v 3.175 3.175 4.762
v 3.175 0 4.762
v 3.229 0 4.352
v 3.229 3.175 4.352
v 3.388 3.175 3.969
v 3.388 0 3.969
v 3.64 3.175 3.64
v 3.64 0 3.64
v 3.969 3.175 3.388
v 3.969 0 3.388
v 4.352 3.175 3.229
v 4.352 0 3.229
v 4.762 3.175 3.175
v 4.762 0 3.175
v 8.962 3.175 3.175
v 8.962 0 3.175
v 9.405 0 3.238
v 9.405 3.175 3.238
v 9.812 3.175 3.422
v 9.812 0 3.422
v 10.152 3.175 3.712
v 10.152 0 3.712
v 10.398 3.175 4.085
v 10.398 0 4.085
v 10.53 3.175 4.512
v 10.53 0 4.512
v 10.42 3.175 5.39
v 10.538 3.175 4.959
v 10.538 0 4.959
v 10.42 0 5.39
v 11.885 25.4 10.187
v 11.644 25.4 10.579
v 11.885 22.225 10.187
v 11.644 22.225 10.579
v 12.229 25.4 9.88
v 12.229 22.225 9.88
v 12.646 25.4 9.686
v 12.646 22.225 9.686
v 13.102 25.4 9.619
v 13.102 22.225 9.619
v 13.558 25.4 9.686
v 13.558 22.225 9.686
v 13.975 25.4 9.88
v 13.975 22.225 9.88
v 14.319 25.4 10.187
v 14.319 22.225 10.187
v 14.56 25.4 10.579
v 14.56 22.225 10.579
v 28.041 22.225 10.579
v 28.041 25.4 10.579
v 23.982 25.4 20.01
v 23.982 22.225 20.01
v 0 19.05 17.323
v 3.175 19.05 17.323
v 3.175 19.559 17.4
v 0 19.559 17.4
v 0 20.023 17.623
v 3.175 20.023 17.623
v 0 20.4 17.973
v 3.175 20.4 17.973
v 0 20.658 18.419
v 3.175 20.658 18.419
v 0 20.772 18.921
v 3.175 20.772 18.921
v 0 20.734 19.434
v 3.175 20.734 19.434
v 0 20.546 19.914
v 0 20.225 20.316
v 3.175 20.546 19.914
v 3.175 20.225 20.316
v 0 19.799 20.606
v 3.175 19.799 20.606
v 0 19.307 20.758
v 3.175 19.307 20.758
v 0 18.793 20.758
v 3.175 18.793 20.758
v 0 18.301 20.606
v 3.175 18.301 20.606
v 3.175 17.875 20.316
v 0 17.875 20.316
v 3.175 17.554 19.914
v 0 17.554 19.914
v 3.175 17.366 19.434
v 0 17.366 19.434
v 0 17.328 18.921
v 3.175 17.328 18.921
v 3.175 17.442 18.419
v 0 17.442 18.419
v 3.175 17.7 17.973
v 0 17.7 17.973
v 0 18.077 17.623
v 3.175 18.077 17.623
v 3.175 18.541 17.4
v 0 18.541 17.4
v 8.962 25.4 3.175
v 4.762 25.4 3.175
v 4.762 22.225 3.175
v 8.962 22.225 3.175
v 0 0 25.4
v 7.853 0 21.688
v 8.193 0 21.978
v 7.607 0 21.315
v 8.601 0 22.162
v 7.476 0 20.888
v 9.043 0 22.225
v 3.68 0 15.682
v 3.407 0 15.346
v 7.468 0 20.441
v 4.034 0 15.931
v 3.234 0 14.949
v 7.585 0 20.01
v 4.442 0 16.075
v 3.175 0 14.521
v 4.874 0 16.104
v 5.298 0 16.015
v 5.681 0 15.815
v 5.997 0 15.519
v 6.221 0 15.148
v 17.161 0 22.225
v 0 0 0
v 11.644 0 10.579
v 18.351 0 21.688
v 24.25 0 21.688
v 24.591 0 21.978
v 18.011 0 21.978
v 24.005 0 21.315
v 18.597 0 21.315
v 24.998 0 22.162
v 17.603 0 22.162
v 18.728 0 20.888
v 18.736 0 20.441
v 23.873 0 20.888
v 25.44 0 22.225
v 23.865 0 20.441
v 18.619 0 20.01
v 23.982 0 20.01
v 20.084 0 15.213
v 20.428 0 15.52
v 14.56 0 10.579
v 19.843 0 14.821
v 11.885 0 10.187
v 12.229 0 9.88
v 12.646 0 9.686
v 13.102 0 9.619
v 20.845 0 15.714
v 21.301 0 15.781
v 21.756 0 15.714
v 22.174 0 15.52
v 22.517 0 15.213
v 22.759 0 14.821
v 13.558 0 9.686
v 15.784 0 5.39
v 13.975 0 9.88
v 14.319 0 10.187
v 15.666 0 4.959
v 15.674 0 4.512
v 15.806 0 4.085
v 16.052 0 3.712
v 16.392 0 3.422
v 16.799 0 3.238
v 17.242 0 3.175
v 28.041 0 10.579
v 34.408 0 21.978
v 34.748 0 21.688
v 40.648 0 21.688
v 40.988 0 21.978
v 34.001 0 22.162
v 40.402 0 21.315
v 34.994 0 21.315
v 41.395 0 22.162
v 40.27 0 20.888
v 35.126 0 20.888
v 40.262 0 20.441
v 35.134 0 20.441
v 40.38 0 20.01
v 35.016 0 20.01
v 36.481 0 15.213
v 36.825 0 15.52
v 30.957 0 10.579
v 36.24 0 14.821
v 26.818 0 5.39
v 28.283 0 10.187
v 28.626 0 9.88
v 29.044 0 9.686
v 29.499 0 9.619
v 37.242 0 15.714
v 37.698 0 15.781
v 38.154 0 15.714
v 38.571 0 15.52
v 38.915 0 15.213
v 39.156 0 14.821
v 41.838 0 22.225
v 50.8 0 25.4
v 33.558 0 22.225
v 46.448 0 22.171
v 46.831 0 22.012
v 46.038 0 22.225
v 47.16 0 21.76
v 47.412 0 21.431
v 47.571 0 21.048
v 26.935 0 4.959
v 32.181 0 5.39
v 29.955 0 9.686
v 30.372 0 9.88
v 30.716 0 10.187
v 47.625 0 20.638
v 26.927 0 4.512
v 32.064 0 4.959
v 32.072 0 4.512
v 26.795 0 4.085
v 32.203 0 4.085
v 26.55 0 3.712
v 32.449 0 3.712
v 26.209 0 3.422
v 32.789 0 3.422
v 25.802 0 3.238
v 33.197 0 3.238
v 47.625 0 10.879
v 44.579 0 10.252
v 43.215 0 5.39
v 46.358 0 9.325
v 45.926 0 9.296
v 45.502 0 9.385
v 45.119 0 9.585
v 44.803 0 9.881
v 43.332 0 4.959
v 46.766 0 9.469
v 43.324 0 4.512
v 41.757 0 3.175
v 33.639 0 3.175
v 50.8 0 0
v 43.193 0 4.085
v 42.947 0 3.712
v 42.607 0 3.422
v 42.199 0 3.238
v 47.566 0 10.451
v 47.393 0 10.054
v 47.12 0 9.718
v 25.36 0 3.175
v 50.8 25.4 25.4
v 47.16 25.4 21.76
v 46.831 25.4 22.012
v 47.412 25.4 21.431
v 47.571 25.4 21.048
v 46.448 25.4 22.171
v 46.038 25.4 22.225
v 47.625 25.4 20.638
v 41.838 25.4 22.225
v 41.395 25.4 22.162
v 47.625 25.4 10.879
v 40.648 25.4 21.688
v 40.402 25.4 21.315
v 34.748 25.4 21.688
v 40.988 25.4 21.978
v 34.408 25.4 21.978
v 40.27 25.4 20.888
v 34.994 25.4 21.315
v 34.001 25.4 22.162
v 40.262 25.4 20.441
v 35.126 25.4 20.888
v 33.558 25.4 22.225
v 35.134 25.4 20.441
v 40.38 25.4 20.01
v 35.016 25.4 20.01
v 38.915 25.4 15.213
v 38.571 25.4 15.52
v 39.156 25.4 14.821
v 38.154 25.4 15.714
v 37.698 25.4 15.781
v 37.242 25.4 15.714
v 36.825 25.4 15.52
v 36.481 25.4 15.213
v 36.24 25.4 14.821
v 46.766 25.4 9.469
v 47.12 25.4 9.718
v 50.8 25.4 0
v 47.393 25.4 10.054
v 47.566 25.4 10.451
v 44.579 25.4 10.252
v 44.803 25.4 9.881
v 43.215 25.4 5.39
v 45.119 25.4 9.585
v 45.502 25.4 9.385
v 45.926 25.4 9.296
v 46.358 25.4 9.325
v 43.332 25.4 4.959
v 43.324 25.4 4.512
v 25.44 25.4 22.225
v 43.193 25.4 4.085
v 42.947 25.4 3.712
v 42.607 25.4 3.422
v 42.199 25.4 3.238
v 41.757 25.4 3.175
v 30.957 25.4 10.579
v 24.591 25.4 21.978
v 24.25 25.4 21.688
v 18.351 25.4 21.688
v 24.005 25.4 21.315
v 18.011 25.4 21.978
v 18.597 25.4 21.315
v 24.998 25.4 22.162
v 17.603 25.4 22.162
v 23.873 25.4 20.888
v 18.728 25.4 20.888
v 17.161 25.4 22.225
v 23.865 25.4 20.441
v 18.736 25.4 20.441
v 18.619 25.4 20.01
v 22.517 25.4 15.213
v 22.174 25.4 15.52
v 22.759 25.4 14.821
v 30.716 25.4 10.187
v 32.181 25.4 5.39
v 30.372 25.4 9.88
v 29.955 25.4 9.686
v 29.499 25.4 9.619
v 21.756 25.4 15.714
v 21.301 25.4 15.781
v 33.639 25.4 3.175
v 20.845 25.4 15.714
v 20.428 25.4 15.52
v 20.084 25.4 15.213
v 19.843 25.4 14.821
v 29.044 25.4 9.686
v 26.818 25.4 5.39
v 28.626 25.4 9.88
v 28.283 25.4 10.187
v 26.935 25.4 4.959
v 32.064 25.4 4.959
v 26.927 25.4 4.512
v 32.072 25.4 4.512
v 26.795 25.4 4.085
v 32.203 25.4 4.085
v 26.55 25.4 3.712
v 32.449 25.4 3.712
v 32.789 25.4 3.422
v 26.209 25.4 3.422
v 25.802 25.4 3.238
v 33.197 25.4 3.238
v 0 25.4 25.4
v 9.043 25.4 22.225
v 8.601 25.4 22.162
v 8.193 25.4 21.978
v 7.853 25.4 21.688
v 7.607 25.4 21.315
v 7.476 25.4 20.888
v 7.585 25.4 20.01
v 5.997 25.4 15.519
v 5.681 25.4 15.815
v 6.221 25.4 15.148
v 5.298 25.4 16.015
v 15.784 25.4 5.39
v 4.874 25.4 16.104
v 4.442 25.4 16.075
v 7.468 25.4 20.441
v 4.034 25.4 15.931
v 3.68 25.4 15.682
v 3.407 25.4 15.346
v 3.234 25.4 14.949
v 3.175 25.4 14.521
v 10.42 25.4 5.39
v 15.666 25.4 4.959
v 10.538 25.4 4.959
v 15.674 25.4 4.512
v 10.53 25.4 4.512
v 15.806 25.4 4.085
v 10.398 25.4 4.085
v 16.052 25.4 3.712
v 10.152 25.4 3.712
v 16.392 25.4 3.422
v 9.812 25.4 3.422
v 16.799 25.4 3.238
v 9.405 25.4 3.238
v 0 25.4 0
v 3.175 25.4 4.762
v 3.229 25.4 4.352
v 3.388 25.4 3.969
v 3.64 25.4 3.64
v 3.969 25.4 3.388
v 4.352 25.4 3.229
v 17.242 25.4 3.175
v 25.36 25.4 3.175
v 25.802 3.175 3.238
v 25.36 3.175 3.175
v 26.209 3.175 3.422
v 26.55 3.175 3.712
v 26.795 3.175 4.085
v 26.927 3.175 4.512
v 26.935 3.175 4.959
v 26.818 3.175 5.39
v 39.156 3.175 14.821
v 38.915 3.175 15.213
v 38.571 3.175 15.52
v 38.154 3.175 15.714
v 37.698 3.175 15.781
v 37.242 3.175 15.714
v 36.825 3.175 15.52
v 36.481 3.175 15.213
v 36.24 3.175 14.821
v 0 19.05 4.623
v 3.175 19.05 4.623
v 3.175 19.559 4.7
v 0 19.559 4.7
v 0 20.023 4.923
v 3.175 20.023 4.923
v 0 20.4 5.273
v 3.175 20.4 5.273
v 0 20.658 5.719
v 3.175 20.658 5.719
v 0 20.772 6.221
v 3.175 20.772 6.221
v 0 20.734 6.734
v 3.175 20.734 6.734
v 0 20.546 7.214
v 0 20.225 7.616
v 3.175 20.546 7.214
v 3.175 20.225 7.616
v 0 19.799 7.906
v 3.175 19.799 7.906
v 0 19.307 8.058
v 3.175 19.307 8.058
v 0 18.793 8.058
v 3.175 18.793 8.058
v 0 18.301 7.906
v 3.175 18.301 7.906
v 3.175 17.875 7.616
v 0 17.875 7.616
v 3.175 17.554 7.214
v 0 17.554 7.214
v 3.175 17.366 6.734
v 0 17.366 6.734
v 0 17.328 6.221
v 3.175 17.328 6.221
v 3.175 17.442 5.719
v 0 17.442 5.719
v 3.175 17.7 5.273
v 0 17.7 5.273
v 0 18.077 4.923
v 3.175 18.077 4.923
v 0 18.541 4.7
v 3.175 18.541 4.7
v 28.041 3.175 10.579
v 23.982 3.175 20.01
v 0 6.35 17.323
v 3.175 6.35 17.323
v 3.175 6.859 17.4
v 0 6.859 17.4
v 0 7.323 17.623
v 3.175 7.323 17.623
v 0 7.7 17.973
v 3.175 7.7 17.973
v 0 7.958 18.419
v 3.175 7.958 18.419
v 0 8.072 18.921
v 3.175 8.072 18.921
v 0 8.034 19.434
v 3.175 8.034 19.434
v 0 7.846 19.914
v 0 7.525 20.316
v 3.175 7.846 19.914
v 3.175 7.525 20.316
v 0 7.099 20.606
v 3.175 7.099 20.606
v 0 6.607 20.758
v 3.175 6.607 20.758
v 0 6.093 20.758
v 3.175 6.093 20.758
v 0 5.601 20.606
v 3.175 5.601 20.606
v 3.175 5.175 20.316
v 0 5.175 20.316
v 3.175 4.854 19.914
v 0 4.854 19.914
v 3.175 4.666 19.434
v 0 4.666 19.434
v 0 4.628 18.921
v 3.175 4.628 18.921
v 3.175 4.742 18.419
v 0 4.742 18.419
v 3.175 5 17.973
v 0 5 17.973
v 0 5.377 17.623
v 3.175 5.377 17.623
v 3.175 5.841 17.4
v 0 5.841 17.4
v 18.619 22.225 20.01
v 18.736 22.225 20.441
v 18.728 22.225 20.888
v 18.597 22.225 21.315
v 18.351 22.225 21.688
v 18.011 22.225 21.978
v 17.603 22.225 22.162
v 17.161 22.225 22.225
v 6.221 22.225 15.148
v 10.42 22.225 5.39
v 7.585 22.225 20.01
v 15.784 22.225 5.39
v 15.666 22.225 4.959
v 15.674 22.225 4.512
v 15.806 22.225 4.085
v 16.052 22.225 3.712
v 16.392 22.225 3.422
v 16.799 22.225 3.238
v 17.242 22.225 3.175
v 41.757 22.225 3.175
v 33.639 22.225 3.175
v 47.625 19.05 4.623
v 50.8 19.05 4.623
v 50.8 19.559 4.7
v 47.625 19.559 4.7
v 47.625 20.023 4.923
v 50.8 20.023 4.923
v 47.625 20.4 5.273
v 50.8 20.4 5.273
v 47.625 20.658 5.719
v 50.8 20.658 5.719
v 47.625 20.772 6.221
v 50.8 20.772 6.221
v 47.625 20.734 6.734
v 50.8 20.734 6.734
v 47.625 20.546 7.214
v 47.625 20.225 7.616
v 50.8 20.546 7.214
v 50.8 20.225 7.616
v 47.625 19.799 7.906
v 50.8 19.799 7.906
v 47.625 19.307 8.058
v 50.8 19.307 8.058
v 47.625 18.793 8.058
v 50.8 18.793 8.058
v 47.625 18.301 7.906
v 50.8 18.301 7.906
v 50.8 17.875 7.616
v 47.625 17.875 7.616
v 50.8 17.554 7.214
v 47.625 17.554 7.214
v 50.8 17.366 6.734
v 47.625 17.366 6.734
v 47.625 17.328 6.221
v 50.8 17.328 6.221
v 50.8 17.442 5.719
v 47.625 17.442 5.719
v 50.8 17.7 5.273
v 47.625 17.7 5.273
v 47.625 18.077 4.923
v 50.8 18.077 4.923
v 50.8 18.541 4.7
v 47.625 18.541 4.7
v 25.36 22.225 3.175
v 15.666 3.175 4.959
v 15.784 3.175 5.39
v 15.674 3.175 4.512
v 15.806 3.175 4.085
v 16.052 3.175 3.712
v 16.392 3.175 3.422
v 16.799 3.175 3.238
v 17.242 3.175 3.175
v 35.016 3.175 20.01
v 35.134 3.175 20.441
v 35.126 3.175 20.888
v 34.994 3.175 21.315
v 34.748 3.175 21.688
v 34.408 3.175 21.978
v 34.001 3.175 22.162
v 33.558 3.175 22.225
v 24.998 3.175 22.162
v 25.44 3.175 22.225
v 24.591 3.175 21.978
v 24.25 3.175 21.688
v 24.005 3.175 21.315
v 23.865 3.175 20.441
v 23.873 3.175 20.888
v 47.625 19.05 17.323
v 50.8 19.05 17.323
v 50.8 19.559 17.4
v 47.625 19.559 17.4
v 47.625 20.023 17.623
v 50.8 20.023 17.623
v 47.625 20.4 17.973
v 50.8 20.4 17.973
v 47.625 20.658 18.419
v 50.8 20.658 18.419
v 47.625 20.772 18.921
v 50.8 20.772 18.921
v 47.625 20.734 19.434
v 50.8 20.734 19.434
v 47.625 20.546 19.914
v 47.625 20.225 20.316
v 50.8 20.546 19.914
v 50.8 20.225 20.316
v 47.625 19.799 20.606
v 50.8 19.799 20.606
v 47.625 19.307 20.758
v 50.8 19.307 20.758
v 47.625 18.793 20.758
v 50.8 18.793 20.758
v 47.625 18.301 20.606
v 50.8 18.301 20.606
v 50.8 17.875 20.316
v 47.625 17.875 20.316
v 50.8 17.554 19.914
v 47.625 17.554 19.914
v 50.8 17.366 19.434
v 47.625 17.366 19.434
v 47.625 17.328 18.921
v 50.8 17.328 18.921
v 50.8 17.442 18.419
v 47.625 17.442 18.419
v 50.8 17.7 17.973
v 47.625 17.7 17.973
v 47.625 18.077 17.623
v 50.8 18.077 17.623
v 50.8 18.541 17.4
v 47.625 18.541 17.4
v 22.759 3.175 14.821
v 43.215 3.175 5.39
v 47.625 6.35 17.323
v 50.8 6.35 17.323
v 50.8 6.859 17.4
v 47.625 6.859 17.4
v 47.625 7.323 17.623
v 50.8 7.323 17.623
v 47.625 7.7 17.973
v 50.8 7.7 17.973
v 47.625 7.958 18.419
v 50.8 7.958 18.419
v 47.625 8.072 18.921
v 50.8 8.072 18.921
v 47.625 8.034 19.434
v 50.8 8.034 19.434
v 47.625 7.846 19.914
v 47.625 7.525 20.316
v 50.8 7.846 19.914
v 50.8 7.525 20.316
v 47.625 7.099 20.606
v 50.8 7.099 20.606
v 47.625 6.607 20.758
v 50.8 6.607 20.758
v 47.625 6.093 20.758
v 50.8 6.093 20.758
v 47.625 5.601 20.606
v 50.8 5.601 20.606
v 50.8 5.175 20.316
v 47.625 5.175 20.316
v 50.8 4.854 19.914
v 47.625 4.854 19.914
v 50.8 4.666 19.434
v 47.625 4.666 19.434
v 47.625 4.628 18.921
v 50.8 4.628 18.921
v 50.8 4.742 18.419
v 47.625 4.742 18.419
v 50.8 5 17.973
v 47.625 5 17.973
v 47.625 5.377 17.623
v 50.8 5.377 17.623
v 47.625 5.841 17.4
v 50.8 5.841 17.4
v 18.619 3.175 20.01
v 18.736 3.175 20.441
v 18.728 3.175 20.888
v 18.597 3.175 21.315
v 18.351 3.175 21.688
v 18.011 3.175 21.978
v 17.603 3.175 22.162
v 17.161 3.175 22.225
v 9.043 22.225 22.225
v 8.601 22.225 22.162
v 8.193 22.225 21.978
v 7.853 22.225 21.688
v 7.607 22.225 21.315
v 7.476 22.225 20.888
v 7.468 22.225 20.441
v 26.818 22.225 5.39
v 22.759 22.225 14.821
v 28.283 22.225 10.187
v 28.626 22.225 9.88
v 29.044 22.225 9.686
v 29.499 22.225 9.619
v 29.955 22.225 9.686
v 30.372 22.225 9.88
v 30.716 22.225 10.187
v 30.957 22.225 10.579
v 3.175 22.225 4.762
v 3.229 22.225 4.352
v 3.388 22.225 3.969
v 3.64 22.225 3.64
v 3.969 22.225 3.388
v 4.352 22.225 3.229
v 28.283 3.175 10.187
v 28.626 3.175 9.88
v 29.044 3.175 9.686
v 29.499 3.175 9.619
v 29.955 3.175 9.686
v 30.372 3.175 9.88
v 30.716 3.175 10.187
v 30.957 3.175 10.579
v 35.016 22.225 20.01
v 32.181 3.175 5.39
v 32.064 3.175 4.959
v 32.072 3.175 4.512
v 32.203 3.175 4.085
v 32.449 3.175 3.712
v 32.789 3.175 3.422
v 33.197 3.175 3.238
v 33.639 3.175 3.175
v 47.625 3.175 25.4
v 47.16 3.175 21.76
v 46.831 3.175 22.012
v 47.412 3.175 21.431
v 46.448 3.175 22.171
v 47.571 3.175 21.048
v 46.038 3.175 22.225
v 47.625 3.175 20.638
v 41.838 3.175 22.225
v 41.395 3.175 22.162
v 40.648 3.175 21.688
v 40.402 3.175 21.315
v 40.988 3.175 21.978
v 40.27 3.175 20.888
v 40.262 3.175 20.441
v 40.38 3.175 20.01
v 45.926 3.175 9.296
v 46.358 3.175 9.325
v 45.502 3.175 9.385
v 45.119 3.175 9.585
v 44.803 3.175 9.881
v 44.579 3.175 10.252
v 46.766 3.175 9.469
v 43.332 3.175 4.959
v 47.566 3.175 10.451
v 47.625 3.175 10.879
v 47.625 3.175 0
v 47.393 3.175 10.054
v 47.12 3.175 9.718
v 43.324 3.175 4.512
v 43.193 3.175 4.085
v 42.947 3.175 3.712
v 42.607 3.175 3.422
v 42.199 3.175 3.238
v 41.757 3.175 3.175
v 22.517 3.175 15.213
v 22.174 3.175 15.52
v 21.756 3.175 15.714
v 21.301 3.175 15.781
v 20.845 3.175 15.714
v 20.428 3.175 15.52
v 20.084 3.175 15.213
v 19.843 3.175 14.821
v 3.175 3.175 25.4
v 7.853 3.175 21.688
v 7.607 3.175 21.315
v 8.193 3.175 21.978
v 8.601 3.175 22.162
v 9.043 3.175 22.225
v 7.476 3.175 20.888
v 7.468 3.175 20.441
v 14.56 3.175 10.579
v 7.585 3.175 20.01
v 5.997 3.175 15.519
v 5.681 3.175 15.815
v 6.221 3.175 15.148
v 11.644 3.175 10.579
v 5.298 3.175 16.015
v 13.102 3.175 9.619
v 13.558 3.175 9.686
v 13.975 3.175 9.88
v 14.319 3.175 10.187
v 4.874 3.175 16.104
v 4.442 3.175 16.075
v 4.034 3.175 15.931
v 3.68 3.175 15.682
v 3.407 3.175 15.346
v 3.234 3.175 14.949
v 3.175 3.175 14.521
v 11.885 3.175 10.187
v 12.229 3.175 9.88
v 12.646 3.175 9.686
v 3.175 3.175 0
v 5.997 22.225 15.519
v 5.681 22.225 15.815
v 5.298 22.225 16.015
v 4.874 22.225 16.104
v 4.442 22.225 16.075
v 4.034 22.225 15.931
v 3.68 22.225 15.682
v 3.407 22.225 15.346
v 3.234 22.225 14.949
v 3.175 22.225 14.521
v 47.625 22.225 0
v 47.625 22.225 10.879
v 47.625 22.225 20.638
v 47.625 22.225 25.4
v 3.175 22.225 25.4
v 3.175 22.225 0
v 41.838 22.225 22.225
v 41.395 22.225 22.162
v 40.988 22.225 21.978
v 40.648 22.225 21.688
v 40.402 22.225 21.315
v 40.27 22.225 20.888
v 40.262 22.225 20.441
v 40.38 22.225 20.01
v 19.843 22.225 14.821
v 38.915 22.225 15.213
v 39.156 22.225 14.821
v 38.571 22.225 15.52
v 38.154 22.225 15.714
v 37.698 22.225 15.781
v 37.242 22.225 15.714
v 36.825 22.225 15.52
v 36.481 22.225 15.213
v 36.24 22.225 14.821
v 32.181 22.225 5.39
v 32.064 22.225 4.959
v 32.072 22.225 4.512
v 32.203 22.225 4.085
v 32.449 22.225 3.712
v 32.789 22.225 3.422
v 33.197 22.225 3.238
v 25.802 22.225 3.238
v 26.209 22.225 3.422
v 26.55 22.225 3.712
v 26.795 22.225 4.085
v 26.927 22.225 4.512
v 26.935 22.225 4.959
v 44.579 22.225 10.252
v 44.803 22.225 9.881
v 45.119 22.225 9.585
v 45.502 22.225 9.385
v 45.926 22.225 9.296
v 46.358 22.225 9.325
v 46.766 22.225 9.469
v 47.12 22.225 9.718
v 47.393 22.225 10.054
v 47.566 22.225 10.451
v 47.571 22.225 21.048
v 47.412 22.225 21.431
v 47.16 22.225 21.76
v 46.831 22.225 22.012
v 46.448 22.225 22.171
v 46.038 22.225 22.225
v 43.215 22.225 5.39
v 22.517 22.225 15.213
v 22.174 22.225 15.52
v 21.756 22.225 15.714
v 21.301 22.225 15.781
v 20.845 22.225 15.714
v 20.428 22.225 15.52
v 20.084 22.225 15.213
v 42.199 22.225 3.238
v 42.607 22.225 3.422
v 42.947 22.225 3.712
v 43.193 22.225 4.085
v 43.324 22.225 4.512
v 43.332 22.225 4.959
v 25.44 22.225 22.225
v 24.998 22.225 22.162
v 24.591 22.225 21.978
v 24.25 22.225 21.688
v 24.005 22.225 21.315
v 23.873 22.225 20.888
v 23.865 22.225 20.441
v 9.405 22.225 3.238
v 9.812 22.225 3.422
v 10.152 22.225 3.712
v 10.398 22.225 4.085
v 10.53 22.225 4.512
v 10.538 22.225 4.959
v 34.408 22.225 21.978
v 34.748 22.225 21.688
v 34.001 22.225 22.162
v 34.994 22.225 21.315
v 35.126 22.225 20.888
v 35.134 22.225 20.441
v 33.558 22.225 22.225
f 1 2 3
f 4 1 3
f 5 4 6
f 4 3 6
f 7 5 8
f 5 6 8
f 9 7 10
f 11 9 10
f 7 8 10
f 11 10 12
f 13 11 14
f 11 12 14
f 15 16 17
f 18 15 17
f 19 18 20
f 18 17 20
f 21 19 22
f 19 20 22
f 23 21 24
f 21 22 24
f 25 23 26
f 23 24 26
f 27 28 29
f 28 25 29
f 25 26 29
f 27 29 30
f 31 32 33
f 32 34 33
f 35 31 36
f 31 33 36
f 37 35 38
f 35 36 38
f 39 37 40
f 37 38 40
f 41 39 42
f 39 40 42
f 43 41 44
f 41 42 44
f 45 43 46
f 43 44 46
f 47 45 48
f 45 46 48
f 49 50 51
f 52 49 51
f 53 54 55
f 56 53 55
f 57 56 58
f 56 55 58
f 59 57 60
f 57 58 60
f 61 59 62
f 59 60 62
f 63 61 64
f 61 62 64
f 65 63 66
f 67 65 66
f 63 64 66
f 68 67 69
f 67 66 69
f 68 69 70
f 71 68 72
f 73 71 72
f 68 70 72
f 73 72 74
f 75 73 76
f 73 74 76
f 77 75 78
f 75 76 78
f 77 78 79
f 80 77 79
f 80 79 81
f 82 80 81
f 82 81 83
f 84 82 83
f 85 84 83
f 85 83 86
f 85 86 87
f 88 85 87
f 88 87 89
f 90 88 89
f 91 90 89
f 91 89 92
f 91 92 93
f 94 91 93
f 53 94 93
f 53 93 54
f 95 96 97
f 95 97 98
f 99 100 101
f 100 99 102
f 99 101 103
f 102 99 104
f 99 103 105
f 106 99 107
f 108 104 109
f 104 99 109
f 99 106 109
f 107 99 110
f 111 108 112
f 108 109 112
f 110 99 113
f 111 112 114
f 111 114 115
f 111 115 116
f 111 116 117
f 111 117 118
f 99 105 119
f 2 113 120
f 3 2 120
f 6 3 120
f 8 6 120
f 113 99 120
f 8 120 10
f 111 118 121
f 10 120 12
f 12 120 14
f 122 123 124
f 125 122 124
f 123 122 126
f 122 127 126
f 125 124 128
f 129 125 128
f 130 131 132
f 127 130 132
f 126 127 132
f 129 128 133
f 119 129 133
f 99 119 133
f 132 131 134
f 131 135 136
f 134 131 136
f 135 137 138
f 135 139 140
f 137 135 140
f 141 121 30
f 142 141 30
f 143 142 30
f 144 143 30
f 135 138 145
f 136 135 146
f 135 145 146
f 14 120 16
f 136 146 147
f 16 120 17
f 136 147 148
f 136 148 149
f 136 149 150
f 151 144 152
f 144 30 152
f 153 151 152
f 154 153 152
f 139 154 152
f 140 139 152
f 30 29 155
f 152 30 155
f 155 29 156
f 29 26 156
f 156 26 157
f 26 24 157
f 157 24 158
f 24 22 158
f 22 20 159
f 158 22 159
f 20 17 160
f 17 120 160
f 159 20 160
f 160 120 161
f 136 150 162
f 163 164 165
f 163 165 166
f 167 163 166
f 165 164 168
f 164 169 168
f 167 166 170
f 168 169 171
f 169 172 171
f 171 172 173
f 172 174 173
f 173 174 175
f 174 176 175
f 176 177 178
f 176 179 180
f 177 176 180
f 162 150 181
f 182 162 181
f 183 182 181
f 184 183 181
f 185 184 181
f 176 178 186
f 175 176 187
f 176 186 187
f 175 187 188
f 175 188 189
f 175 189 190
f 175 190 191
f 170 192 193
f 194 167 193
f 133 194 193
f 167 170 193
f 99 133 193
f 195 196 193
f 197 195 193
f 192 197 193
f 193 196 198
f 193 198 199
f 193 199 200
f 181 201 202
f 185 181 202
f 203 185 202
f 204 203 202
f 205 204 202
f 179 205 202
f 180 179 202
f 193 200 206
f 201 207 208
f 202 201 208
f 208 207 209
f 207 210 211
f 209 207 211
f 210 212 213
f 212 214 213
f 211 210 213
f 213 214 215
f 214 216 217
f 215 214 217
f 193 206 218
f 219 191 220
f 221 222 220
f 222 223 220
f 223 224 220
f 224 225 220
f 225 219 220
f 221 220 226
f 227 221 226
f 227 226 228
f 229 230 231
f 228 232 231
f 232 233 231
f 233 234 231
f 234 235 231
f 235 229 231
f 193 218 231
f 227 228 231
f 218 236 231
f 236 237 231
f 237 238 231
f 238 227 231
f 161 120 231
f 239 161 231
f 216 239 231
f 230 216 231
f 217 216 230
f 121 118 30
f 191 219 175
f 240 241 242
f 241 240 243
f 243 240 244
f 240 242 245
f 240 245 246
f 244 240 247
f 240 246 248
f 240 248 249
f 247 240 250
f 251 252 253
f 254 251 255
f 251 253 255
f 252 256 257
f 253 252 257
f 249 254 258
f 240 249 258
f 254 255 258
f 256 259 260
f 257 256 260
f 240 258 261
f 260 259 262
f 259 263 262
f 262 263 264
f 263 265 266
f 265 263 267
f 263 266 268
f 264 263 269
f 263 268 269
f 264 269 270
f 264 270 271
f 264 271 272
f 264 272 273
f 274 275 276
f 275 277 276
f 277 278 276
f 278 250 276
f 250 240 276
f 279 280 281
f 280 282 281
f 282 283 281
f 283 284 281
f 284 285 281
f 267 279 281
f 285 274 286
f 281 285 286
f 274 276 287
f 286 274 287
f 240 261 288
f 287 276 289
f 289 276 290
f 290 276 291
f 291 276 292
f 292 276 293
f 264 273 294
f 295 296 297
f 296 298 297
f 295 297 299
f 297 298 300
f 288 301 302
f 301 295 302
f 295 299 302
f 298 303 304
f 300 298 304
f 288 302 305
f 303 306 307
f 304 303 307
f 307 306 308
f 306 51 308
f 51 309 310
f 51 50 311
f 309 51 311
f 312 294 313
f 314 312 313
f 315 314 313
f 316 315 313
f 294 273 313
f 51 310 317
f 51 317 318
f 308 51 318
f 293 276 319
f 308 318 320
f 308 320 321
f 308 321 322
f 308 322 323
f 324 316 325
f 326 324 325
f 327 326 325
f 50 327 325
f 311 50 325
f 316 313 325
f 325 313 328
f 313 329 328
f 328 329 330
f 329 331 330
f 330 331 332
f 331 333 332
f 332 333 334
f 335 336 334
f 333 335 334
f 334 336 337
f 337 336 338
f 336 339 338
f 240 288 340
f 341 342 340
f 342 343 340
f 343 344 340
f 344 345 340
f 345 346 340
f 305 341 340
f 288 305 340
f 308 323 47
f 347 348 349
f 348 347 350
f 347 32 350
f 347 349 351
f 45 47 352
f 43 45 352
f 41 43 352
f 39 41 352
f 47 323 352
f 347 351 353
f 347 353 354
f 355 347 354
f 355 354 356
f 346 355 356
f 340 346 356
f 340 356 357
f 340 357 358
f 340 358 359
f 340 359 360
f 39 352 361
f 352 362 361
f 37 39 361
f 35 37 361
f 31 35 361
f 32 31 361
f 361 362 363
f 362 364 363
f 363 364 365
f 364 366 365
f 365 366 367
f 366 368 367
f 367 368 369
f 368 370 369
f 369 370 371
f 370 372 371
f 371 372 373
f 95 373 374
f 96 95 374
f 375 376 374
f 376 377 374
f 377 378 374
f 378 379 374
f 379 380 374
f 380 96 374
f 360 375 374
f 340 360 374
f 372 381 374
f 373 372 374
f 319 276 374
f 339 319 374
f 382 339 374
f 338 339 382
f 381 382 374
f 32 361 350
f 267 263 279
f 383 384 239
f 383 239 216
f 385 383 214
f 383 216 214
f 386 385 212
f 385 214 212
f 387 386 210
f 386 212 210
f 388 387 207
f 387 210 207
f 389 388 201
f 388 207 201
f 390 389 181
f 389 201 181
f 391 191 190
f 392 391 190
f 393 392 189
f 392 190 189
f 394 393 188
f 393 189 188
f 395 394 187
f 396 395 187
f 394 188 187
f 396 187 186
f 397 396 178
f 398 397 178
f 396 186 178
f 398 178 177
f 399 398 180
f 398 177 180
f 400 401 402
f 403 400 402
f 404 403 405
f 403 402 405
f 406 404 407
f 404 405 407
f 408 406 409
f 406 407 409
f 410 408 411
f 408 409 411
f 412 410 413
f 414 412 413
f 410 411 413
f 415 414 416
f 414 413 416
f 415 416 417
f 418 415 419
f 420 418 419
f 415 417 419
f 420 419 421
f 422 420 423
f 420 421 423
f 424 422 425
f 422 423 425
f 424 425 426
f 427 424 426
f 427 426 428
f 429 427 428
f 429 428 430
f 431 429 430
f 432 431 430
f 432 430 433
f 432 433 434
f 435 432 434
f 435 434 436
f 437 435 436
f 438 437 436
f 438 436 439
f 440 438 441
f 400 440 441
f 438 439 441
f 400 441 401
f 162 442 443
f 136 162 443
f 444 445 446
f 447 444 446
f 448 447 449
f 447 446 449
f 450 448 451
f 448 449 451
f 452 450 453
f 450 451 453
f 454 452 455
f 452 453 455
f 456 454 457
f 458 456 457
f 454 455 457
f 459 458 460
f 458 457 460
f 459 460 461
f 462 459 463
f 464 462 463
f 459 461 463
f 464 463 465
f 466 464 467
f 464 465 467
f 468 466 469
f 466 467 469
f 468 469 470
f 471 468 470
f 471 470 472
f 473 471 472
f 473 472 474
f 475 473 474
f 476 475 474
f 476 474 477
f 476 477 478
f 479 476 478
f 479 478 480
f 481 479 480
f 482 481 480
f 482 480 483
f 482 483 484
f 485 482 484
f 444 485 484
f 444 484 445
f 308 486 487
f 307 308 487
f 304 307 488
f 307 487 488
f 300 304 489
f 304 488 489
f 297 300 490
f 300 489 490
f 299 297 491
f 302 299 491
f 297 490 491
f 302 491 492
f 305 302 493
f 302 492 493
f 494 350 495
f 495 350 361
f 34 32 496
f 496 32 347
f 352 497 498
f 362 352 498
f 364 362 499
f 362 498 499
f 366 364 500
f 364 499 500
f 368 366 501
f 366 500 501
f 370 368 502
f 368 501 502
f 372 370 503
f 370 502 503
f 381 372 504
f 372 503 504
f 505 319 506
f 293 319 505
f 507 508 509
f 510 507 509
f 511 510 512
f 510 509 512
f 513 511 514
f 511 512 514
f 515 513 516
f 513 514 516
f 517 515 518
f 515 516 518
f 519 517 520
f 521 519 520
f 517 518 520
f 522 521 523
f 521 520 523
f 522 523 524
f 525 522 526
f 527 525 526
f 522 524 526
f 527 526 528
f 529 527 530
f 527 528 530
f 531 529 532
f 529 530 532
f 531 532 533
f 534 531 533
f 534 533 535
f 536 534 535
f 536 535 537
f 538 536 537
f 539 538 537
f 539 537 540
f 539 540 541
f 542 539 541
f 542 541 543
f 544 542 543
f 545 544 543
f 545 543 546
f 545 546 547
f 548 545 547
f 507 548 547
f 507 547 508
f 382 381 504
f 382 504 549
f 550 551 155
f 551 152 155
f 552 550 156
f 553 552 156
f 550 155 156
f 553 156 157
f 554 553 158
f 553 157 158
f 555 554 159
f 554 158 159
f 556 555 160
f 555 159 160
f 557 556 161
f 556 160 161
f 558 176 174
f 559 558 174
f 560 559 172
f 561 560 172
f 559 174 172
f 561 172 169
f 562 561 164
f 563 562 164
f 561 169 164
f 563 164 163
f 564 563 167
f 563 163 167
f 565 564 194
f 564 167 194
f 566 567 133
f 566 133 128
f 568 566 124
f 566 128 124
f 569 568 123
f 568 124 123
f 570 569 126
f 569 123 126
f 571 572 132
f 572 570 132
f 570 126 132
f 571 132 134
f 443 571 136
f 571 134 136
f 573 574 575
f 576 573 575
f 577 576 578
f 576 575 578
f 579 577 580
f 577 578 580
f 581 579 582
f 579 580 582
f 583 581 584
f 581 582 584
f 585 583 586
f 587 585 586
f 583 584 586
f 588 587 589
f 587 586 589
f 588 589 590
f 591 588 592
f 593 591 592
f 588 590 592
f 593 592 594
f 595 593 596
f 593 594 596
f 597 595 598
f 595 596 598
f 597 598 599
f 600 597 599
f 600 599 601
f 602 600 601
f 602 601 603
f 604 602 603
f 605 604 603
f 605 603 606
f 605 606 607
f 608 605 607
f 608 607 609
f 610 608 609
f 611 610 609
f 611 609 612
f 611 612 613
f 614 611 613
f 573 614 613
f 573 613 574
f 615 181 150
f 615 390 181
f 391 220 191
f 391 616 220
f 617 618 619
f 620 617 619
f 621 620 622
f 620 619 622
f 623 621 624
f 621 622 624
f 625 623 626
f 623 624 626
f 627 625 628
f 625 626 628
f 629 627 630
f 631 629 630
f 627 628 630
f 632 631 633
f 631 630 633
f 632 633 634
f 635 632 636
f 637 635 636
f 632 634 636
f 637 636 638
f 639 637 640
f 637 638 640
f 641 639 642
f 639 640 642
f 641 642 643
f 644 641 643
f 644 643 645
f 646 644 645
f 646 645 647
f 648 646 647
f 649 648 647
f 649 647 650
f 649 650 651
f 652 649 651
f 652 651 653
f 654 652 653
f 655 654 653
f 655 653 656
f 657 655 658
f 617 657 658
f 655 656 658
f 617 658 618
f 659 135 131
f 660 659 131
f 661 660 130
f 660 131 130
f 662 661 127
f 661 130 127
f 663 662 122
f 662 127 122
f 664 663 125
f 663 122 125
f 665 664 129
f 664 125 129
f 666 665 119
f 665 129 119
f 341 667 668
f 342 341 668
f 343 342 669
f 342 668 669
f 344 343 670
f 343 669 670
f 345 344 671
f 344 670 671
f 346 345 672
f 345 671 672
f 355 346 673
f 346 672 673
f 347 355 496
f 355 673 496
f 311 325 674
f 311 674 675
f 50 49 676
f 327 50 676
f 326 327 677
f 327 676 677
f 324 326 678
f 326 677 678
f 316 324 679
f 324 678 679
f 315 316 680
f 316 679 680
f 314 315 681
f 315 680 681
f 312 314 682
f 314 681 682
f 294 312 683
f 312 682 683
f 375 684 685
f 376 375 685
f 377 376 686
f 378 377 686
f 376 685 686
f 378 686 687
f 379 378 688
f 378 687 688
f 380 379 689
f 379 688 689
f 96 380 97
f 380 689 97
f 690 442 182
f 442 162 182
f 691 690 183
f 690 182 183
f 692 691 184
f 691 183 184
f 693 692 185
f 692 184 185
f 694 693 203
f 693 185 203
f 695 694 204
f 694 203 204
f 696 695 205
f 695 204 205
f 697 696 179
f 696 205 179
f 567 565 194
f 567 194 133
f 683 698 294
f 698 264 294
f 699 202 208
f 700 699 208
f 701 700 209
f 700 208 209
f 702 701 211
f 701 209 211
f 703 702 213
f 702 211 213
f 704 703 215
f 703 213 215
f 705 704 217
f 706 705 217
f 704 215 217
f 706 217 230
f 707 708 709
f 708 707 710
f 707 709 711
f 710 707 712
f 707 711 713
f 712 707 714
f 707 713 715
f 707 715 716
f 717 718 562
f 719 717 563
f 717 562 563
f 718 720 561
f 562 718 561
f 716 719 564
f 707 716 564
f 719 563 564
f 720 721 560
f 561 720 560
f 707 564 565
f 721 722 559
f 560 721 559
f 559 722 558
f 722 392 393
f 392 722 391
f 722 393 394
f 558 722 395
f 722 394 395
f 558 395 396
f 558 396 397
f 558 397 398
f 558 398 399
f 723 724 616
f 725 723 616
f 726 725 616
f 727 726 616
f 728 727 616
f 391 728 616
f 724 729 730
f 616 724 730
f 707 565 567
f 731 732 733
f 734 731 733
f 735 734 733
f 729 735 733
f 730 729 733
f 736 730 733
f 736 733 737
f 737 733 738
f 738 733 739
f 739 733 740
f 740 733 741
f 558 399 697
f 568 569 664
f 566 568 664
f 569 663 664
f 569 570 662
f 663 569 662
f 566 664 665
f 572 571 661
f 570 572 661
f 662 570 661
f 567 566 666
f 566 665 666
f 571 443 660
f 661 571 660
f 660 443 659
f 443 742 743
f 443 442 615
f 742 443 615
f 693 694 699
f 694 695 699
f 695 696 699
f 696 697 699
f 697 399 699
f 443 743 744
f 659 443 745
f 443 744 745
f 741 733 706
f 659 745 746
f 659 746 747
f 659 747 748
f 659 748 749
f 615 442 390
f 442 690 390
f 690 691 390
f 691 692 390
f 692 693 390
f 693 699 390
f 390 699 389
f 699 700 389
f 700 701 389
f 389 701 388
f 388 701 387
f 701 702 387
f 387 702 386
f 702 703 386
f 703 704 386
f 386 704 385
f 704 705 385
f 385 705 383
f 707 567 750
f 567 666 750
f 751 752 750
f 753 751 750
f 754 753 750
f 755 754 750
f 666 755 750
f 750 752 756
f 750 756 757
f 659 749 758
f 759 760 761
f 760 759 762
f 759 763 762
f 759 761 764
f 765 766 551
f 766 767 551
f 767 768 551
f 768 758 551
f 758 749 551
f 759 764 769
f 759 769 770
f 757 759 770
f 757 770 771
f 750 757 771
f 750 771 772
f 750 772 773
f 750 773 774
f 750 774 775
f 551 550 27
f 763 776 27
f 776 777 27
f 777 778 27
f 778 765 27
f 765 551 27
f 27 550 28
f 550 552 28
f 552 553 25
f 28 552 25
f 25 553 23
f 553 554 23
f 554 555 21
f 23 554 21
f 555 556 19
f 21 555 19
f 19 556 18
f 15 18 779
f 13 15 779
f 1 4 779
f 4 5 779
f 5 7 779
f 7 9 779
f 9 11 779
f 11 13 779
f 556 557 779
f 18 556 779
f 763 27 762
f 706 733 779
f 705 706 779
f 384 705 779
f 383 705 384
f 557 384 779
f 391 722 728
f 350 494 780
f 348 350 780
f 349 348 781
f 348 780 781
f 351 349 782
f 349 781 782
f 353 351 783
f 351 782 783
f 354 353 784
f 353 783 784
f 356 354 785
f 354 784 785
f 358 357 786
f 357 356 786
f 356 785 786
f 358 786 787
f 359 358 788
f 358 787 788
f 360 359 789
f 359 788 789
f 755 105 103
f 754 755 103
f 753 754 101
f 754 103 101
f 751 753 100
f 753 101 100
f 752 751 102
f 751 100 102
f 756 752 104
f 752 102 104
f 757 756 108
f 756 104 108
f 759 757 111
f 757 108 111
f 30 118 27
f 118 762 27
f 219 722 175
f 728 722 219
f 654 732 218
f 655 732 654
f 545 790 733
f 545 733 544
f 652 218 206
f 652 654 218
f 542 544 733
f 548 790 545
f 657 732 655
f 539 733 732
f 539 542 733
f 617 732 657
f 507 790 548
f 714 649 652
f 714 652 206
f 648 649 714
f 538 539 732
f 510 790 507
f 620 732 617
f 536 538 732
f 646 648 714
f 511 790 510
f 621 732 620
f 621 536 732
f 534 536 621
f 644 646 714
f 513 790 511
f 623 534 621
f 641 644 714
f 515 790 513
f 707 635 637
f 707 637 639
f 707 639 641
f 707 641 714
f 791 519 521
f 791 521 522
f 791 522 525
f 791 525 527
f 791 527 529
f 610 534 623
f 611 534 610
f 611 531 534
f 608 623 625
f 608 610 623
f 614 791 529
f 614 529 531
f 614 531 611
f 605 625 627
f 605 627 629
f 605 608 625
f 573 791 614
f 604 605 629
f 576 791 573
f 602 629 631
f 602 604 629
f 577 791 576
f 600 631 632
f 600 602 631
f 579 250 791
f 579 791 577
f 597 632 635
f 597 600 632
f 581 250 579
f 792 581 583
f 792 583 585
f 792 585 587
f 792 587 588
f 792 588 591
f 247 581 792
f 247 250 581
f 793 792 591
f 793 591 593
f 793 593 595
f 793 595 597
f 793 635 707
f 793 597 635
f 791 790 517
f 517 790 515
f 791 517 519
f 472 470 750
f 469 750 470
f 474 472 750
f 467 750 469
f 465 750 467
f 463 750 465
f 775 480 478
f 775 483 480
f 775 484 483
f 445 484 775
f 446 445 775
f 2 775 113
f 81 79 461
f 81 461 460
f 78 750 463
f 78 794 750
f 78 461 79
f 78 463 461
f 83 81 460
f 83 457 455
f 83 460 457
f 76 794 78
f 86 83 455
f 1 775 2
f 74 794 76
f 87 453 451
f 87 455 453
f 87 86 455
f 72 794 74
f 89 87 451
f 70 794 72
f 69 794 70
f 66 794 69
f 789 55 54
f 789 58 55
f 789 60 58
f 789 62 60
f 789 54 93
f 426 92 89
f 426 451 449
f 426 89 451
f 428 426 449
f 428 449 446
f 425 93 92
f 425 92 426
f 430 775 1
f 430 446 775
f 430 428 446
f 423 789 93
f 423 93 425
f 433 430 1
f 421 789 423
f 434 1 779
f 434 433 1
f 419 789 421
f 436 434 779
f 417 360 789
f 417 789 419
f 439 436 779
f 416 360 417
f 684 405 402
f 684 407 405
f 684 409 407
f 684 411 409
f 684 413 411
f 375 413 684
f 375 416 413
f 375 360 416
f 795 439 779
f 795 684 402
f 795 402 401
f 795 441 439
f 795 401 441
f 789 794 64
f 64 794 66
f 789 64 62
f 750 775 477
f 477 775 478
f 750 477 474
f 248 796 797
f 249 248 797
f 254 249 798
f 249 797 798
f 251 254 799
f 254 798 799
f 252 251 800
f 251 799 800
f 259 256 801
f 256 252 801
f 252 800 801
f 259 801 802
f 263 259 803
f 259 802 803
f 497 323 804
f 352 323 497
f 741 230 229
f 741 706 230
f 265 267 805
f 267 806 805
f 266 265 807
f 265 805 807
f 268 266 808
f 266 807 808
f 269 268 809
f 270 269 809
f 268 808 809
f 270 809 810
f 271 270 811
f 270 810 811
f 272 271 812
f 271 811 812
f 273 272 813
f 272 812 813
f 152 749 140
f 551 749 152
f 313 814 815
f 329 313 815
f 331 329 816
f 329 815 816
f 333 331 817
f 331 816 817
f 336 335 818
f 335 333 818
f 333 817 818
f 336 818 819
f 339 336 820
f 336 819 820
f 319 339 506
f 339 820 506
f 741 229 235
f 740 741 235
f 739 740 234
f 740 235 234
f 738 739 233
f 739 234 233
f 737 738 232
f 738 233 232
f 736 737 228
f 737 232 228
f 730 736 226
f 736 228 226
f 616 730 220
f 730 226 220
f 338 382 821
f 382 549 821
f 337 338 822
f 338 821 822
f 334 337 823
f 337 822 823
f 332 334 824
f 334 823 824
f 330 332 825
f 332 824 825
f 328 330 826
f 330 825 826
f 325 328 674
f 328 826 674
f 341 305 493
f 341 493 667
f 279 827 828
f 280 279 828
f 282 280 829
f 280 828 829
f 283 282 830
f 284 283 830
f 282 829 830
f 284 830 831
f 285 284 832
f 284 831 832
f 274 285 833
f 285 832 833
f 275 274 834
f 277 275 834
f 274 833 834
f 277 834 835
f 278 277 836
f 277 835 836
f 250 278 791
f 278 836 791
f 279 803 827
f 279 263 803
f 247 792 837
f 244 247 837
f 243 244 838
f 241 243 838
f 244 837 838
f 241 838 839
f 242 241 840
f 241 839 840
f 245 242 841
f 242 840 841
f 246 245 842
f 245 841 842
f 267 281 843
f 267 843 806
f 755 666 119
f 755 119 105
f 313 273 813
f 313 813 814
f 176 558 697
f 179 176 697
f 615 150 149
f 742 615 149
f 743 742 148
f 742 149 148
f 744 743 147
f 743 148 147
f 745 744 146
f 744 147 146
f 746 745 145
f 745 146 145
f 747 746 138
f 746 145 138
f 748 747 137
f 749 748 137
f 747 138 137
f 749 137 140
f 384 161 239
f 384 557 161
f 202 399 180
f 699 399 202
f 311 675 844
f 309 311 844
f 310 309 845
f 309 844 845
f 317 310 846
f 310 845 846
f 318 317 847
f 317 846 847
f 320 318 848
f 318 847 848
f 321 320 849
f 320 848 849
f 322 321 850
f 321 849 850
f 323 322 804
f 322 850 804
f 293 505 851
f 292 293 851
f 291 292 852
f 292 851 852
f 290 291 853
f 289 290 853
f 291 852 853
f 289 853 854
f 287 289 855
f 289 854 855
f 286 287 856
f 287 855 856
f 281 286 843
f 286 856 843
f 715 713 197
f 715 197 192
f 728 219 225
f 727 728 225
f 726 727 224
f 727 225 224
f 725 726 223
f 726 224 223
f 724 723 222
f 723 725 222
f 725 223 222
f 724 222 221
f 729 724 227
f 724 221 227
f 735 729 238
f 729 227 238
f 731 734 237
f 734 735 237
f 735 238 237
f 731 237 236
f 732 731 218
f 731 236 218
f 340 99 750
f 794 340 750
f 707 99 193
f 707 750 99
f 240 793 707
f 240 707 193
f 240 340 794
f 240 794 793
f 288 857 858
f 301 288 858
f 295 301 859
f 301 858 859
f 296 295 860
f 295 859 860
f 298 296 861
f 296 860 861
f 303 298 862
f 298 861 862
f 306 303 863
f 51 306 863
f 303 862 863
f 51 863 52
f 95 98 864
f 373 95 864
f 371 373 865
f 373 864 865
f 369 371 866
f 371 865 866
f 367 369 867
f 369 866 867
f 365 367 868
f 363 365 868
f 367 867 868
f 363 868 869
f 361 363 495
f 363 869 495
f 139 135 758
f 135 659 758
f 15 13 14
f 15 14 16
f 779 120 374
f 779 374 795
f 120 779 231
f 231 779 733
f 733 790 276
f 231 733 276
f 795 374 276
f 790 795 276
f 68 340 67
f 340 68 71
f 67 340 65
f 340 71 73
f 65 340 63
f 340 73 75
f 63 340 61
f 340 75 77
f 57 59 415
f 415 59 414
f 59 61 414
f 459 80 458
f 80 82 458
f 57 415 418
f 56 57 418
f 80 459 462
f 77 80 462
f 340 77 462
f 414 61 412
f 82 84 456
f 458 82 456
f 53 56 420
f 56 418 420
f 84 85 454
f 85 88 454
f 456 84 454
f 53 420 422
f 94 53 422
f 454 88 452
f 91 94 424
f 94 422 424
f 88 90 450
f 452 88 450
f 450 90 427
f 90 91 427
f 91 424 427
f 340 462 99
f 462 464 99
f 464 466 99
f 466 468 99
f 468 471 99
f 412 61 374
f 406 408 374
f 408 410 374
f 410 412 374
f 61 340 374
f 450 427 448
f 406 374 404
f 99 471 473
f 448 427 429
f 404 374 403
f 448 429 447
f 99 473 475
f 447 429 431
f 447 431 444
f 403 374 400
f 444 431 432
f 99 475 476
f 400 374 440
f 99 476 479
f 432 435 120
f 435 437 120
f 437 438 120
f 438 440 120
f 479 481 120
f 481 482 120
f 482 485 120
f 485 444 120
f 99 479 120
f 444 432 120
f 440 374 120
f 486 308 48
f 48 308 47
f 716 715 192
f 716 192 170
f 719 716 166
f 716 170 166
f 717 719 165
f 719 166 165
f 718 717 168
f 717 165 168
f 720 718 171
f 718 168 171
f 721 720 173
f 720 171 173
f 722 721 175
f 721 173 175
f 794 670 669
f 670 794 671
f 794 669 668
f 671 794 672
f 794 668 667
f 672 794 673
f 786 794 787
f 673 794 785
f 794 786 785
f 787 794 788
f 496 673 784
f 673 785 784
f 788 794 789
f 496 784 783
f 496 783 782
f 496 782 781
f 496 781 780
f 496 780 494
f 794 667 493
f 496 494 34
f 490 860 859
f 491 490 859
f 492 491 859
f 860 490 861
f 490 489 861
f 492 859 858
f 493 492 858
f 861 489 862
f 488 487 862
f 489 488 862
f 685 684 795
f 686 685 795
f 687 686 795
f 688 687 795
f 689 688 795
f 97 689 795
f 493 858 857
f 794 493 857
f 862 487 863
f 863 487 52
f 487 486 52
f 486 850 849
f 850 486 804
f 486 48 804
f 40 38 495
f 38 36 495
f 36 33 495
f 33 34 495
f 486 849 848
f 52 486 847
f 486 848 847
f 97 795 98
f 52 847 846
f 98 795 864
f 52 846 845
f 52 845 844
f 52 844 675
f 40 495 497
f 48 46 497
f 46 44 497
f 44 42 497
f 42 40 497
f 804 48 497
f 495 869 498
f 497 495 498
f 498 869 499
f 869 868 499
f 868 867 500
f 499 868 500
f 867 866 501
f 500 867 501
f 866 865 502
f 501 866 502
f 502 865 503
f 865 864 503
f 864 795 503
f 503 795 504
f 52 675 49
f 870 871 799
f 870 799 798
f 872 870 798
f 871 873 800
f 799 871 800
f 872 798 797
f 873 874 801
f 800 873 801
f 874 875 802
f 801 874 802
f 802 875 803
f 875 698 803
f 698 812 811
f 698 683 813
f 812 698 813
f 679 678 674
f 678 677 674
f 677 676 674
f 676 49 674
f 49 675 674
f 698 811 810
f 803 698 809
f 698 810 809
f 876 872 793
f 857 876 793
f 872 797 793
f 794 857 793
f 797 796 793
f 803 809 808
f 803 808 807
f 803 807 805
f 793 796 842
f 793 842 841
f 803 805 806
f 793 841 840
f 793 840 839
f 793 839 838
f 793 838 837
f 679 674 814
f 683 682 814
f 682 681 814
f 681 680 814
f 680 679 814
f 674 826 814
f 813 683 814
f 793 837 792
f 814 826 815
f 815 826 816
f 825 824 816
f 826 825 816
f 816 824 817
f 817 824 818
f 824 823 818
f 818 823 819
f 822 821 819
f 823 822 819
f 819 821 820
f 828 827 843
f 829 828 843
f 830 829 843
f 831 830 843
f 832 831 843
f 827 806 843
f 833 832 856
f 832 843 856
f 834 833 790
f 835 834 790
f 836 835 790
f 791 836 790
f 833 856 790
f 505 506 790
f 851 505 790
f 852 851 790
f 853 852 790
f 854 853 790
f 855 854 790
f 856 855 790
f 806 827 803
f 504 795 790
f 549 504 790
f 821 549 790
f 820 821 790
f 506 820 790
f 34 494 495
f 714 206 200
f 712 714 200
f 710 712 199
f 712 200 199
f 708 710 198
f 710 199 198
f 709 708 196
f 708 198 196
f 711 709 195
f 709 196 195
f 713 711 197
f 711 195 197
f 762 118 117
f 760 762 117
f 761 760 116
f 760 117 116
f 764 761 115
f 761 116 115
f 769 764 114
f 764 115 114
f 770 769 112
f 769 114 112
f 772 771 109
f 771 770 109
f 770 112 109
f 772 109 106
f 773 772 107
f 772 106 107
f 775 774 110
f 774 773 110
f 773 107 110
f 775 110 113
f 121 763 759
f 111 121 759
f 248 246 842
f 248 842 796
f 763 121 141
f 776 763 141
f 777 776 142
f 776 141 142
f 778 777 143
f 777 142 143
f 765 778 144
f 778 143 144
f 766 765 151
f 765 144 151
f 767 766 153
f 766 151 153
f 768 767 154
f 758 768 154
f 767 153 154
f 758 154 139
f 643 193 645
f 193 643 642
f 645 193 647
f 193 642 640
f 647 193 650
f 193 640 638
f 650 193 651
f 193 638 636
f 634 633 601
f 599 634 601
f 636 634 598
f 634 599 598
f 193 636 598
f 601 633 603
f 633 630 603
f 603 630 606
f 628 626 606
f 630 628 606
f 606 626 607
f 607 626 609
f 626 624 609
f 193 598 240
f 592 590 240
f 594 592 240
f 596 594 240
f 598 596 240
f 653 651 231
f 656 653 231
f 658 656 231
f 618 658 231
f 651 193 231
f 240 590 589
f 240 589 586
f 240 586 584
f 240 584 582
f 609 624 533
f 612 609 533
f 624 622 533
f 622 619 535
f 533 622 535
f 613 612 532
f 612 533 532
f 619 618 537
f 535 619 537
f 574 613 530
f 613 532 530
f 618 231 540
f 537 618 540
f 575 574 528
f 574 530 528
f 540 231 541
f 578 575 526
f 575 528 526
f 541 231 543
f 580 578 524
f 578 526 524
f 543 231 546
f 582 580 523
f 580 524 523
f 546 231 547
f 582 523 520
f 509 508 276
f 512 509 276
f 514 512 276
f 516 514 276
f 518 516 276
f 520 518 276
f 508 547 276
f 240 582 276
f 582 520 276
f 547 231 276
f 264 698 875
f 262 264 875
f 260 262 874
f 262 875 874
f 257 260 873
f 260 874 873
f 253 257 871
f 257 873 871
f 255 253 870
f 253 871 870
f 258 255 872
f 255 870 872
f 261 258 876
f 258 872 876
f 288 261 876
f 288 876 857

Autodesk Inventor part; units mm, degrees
ref_plane "YZ Plane" through (0, 0, 0) normal (1, 0, 0) x (0, 1, 0)
ref_plane "XZ Plane" through (0, 0, 0) normal (0, 1, 0) x (-1, 0, 0)
ref_plane "XY Plane" through (0, 0, 0) normal (0, 0, 1) x (1, 0, 0)
sketch "Sketch1" plane through (0, 0, 0) normal (0, 0, 1) x (1, 0, 0)
  line L0 (0, 0) -> (50.8, 0)
  line L1 (50.8, 0) -> (50.8, 25.4)
  line L2 (50.8, 25.4) -> (0, 25.4)
  line L3 (0, 25.4) -> (0, 0)
  line L4 (3.175, 22.225) -> (47.625, 22.225)
  line L5 (47.625, 22.225) -> (47.625, 3.175)
  line L6 (47.625, 3.175) -> (3.175, 3.175)
  line L7 (3.175, 3.175) -> (3.175, 22.225)
  dimension "d0" = 50.8
  dimension "d1" = 25.4
  dimension "d2" = 3.175
  dimension "d3" = 3.175
  dimension "d4" = 3.175
  dimension "d5" = 3.175
extrude "Extrusion1" add sketch "Sketch1" along normal blind 25.4
sketch "Sketch2" plane through (0, 25.4, 0) normal (0, 1, 0) x (1, 0, 0)
  line L0 (0, -25.4) -> (50.8, -25.4) projected
  line L1 (50.8, 0) -> (50.8, -25.4) projected
  line L2 (0, 0) -> (0, -25.4) projected
  line L3 (3.175, -22.225) -> (3.175, -3.175)
  line L4 (47.625, -22.225) -> (3.175, -22.225)
  line L5 (3.175, -3.175) -> (47.625, -3.175)
  line L6 (27.7711, -3.175) -> (21.3007, -18.2093)
  line L7 (29.4993, -3.175) -> (21.3007, -22.225) construction
  line L8 (29.4993, -7.1907) -> (23.0289, -22.225)
  line L9 (35.9698, -22.225) -> (29.4993, -7.1907)
  line L10 (37.698, -22.225) -> (29.4993, -3.175) construction
  line L11 (37.698, -18.2093) -> (31.2276, -3.175)
  line L12 (44.1684, -3.175) -> (37.698, -18.2093)
  line L13 (45.8967, -3.175) -> (37.698, -22.225) construction
  line L14 (39.4263, -22.225) -> (47.625, -3.175)
  line L15 (47.625, -3.175) -> (47.625, -22.225)
  line L16 (21.3007, -18.2093) -> (14.8302, -3.175)
  line L17 (21.3007, -22.225) -> (13.102, -3.175) construction
  line L18 (19.5724, -22.225) -> (13.102, -7.1907)
  line L19 (13.102, -7.1907) -> (6.6316, -22.225)
  line L20 (13.102, -3.175) -> (4.9033, -22.225) construction
  line L21 (3.175, -22.225) -> (11.3737, -3.175)
  line L22 (50.8, 0) -> (0, 0) projected
  dimension "d9" = 1.5875
  dimension "d10" = 3.175
  dimension "d11" = 1.5875
  dimension "d12" = 3.175
  dimension "d13" = 1.5875
  dimension "d14" = 3.175
  dimension "d15" = 1.5875
  dimension "d16" = 3.175
  dimension "d17" = 1.5875
  dimension "d18" = 3.175
  dimension "d19" = 23.286
  dimension "d20" = 46.572
  dimension "d21" = 46.572
  dimension "d22" = 46.572
  dimension "d23" = 46.572
  dimension "d24" = 3.175
  dimension "d26" = 3.175
  dimension "d27" = 3.175
  dimension "d32" = 3.175
extrude "Extrusion2" cut sketch "Sketch2" against normal blind 76.2 contours L3 L5 L21 | L19 L18 L4 | L5 L6 L16 | L8 L9 L4 | L5 L12 L11 | L14 L15 L4
fillet "Fillet1" radius 1.5875 18 edges at (3.175, 23.8125, 3.175) (11.3737, 23.8125, 3.175) (3.175, 23.8125, 22.225) (13.102, 23.8125, 7.1907) (6.6316, 23.8125, 22.225) (19.5724, 23.8125, 22.225) (14.8302, 23.8125, 3.175) (21.3007, 23.8125, 18.2093) (27.7711, 23.8125, 3.175) (29.4993, 23.8125, 7.1907) (23.0289, 23.8125, 22.225) (35.9698, 23.8125, 22.225) (31.2276, 23.8125, 3.175) (37.698, 23.8125, 18.2093) (44.1684, 23.8125, 3.175) (47.625, 23.8125, 3.175) (39.4263, 23.8125, 22.225) (47.625, 23.8125, 22.225)
fillet "Fillet2" radius 1.5875 18 edges at (11.3737, 1.5875, 3.175) (3.175, 1.5875, 3.175) (3.175, 1.5875, 22.225) (6.6316, 1.5875, 22.225) (13.102, 1.5875, 7.1907) (19.5724, 1.5875, 22.225) (21.3007, 1.5875, 18.2093) (14.8302, 1.5875, 3.175) (27.7711, 1.5875, 3.175) (29.4993, 1.5875, 7.1907) (23.0289, 1.5875, 22.225) (35.9698, 1.5875, 22.225) (37.698, 1.5875, 18.2093) (31.2276, 1.5875, 3.175) (44.1684, 1.5875, 3.175) (47.625, 1.5875, 3.175) (39.4263, 1.5875, 22.225) (47.625, 1.5875, 22.225)
sketch "Sketch3" plane through (50.8, 0, 0) normal (1, 0, 0) x (0, 0, -1)
  line L0 (-25.4, 25.4) -> (-25.4, 0) projected
  line L1 (0, 0) -> (-25.4, 0) projected
  line L2 (0, 0) -> (0, 25.4) projected
  line L3 (0, 25.4) -> (-25.4, 25.4) projected
  circle A0 centre (-19.05, 19.05) radius 1.7272
  circle A1 centre (-19.05, 6.35) radius 1.7272
  circle A2 centre (-6.35, 19.05) radius 1.7272
  dimension "d33" = 3.4544
  dimension "d34" = 6.35
  dimension "d35" = 6.35
  dimension "d36" = 6.35
  dimension "d37" = 6.35
extrude "Extrusion3" cut sketch "Sketch3" against normal through all contours A0 | A1 | A2
equation "\"d3\" = d2"
equation "\"d4\" = d2"
equation "\"d5\" = d2"
equation "\"d10\" = 2 * d9"
equation "\"d11\" = d9"
equation "\"d12\" = d10"
equation "\"d13\" = d11"
equation "\"d15\" = d13"
equation "\"d16\" = d14"
equation "\"d17\" = d15"
equation "\"d18\" = d16"
equation "\"d20\" = 2 * d19"
equation "\"d21\" = d20"
equation "\"d22\" = d21"
equation "\"d23\" = d22"
equation "\"d36\" = d35"
equation "\"d37\" = d34"
properties part number "1x2 Aluminum Tube Corner Post"
